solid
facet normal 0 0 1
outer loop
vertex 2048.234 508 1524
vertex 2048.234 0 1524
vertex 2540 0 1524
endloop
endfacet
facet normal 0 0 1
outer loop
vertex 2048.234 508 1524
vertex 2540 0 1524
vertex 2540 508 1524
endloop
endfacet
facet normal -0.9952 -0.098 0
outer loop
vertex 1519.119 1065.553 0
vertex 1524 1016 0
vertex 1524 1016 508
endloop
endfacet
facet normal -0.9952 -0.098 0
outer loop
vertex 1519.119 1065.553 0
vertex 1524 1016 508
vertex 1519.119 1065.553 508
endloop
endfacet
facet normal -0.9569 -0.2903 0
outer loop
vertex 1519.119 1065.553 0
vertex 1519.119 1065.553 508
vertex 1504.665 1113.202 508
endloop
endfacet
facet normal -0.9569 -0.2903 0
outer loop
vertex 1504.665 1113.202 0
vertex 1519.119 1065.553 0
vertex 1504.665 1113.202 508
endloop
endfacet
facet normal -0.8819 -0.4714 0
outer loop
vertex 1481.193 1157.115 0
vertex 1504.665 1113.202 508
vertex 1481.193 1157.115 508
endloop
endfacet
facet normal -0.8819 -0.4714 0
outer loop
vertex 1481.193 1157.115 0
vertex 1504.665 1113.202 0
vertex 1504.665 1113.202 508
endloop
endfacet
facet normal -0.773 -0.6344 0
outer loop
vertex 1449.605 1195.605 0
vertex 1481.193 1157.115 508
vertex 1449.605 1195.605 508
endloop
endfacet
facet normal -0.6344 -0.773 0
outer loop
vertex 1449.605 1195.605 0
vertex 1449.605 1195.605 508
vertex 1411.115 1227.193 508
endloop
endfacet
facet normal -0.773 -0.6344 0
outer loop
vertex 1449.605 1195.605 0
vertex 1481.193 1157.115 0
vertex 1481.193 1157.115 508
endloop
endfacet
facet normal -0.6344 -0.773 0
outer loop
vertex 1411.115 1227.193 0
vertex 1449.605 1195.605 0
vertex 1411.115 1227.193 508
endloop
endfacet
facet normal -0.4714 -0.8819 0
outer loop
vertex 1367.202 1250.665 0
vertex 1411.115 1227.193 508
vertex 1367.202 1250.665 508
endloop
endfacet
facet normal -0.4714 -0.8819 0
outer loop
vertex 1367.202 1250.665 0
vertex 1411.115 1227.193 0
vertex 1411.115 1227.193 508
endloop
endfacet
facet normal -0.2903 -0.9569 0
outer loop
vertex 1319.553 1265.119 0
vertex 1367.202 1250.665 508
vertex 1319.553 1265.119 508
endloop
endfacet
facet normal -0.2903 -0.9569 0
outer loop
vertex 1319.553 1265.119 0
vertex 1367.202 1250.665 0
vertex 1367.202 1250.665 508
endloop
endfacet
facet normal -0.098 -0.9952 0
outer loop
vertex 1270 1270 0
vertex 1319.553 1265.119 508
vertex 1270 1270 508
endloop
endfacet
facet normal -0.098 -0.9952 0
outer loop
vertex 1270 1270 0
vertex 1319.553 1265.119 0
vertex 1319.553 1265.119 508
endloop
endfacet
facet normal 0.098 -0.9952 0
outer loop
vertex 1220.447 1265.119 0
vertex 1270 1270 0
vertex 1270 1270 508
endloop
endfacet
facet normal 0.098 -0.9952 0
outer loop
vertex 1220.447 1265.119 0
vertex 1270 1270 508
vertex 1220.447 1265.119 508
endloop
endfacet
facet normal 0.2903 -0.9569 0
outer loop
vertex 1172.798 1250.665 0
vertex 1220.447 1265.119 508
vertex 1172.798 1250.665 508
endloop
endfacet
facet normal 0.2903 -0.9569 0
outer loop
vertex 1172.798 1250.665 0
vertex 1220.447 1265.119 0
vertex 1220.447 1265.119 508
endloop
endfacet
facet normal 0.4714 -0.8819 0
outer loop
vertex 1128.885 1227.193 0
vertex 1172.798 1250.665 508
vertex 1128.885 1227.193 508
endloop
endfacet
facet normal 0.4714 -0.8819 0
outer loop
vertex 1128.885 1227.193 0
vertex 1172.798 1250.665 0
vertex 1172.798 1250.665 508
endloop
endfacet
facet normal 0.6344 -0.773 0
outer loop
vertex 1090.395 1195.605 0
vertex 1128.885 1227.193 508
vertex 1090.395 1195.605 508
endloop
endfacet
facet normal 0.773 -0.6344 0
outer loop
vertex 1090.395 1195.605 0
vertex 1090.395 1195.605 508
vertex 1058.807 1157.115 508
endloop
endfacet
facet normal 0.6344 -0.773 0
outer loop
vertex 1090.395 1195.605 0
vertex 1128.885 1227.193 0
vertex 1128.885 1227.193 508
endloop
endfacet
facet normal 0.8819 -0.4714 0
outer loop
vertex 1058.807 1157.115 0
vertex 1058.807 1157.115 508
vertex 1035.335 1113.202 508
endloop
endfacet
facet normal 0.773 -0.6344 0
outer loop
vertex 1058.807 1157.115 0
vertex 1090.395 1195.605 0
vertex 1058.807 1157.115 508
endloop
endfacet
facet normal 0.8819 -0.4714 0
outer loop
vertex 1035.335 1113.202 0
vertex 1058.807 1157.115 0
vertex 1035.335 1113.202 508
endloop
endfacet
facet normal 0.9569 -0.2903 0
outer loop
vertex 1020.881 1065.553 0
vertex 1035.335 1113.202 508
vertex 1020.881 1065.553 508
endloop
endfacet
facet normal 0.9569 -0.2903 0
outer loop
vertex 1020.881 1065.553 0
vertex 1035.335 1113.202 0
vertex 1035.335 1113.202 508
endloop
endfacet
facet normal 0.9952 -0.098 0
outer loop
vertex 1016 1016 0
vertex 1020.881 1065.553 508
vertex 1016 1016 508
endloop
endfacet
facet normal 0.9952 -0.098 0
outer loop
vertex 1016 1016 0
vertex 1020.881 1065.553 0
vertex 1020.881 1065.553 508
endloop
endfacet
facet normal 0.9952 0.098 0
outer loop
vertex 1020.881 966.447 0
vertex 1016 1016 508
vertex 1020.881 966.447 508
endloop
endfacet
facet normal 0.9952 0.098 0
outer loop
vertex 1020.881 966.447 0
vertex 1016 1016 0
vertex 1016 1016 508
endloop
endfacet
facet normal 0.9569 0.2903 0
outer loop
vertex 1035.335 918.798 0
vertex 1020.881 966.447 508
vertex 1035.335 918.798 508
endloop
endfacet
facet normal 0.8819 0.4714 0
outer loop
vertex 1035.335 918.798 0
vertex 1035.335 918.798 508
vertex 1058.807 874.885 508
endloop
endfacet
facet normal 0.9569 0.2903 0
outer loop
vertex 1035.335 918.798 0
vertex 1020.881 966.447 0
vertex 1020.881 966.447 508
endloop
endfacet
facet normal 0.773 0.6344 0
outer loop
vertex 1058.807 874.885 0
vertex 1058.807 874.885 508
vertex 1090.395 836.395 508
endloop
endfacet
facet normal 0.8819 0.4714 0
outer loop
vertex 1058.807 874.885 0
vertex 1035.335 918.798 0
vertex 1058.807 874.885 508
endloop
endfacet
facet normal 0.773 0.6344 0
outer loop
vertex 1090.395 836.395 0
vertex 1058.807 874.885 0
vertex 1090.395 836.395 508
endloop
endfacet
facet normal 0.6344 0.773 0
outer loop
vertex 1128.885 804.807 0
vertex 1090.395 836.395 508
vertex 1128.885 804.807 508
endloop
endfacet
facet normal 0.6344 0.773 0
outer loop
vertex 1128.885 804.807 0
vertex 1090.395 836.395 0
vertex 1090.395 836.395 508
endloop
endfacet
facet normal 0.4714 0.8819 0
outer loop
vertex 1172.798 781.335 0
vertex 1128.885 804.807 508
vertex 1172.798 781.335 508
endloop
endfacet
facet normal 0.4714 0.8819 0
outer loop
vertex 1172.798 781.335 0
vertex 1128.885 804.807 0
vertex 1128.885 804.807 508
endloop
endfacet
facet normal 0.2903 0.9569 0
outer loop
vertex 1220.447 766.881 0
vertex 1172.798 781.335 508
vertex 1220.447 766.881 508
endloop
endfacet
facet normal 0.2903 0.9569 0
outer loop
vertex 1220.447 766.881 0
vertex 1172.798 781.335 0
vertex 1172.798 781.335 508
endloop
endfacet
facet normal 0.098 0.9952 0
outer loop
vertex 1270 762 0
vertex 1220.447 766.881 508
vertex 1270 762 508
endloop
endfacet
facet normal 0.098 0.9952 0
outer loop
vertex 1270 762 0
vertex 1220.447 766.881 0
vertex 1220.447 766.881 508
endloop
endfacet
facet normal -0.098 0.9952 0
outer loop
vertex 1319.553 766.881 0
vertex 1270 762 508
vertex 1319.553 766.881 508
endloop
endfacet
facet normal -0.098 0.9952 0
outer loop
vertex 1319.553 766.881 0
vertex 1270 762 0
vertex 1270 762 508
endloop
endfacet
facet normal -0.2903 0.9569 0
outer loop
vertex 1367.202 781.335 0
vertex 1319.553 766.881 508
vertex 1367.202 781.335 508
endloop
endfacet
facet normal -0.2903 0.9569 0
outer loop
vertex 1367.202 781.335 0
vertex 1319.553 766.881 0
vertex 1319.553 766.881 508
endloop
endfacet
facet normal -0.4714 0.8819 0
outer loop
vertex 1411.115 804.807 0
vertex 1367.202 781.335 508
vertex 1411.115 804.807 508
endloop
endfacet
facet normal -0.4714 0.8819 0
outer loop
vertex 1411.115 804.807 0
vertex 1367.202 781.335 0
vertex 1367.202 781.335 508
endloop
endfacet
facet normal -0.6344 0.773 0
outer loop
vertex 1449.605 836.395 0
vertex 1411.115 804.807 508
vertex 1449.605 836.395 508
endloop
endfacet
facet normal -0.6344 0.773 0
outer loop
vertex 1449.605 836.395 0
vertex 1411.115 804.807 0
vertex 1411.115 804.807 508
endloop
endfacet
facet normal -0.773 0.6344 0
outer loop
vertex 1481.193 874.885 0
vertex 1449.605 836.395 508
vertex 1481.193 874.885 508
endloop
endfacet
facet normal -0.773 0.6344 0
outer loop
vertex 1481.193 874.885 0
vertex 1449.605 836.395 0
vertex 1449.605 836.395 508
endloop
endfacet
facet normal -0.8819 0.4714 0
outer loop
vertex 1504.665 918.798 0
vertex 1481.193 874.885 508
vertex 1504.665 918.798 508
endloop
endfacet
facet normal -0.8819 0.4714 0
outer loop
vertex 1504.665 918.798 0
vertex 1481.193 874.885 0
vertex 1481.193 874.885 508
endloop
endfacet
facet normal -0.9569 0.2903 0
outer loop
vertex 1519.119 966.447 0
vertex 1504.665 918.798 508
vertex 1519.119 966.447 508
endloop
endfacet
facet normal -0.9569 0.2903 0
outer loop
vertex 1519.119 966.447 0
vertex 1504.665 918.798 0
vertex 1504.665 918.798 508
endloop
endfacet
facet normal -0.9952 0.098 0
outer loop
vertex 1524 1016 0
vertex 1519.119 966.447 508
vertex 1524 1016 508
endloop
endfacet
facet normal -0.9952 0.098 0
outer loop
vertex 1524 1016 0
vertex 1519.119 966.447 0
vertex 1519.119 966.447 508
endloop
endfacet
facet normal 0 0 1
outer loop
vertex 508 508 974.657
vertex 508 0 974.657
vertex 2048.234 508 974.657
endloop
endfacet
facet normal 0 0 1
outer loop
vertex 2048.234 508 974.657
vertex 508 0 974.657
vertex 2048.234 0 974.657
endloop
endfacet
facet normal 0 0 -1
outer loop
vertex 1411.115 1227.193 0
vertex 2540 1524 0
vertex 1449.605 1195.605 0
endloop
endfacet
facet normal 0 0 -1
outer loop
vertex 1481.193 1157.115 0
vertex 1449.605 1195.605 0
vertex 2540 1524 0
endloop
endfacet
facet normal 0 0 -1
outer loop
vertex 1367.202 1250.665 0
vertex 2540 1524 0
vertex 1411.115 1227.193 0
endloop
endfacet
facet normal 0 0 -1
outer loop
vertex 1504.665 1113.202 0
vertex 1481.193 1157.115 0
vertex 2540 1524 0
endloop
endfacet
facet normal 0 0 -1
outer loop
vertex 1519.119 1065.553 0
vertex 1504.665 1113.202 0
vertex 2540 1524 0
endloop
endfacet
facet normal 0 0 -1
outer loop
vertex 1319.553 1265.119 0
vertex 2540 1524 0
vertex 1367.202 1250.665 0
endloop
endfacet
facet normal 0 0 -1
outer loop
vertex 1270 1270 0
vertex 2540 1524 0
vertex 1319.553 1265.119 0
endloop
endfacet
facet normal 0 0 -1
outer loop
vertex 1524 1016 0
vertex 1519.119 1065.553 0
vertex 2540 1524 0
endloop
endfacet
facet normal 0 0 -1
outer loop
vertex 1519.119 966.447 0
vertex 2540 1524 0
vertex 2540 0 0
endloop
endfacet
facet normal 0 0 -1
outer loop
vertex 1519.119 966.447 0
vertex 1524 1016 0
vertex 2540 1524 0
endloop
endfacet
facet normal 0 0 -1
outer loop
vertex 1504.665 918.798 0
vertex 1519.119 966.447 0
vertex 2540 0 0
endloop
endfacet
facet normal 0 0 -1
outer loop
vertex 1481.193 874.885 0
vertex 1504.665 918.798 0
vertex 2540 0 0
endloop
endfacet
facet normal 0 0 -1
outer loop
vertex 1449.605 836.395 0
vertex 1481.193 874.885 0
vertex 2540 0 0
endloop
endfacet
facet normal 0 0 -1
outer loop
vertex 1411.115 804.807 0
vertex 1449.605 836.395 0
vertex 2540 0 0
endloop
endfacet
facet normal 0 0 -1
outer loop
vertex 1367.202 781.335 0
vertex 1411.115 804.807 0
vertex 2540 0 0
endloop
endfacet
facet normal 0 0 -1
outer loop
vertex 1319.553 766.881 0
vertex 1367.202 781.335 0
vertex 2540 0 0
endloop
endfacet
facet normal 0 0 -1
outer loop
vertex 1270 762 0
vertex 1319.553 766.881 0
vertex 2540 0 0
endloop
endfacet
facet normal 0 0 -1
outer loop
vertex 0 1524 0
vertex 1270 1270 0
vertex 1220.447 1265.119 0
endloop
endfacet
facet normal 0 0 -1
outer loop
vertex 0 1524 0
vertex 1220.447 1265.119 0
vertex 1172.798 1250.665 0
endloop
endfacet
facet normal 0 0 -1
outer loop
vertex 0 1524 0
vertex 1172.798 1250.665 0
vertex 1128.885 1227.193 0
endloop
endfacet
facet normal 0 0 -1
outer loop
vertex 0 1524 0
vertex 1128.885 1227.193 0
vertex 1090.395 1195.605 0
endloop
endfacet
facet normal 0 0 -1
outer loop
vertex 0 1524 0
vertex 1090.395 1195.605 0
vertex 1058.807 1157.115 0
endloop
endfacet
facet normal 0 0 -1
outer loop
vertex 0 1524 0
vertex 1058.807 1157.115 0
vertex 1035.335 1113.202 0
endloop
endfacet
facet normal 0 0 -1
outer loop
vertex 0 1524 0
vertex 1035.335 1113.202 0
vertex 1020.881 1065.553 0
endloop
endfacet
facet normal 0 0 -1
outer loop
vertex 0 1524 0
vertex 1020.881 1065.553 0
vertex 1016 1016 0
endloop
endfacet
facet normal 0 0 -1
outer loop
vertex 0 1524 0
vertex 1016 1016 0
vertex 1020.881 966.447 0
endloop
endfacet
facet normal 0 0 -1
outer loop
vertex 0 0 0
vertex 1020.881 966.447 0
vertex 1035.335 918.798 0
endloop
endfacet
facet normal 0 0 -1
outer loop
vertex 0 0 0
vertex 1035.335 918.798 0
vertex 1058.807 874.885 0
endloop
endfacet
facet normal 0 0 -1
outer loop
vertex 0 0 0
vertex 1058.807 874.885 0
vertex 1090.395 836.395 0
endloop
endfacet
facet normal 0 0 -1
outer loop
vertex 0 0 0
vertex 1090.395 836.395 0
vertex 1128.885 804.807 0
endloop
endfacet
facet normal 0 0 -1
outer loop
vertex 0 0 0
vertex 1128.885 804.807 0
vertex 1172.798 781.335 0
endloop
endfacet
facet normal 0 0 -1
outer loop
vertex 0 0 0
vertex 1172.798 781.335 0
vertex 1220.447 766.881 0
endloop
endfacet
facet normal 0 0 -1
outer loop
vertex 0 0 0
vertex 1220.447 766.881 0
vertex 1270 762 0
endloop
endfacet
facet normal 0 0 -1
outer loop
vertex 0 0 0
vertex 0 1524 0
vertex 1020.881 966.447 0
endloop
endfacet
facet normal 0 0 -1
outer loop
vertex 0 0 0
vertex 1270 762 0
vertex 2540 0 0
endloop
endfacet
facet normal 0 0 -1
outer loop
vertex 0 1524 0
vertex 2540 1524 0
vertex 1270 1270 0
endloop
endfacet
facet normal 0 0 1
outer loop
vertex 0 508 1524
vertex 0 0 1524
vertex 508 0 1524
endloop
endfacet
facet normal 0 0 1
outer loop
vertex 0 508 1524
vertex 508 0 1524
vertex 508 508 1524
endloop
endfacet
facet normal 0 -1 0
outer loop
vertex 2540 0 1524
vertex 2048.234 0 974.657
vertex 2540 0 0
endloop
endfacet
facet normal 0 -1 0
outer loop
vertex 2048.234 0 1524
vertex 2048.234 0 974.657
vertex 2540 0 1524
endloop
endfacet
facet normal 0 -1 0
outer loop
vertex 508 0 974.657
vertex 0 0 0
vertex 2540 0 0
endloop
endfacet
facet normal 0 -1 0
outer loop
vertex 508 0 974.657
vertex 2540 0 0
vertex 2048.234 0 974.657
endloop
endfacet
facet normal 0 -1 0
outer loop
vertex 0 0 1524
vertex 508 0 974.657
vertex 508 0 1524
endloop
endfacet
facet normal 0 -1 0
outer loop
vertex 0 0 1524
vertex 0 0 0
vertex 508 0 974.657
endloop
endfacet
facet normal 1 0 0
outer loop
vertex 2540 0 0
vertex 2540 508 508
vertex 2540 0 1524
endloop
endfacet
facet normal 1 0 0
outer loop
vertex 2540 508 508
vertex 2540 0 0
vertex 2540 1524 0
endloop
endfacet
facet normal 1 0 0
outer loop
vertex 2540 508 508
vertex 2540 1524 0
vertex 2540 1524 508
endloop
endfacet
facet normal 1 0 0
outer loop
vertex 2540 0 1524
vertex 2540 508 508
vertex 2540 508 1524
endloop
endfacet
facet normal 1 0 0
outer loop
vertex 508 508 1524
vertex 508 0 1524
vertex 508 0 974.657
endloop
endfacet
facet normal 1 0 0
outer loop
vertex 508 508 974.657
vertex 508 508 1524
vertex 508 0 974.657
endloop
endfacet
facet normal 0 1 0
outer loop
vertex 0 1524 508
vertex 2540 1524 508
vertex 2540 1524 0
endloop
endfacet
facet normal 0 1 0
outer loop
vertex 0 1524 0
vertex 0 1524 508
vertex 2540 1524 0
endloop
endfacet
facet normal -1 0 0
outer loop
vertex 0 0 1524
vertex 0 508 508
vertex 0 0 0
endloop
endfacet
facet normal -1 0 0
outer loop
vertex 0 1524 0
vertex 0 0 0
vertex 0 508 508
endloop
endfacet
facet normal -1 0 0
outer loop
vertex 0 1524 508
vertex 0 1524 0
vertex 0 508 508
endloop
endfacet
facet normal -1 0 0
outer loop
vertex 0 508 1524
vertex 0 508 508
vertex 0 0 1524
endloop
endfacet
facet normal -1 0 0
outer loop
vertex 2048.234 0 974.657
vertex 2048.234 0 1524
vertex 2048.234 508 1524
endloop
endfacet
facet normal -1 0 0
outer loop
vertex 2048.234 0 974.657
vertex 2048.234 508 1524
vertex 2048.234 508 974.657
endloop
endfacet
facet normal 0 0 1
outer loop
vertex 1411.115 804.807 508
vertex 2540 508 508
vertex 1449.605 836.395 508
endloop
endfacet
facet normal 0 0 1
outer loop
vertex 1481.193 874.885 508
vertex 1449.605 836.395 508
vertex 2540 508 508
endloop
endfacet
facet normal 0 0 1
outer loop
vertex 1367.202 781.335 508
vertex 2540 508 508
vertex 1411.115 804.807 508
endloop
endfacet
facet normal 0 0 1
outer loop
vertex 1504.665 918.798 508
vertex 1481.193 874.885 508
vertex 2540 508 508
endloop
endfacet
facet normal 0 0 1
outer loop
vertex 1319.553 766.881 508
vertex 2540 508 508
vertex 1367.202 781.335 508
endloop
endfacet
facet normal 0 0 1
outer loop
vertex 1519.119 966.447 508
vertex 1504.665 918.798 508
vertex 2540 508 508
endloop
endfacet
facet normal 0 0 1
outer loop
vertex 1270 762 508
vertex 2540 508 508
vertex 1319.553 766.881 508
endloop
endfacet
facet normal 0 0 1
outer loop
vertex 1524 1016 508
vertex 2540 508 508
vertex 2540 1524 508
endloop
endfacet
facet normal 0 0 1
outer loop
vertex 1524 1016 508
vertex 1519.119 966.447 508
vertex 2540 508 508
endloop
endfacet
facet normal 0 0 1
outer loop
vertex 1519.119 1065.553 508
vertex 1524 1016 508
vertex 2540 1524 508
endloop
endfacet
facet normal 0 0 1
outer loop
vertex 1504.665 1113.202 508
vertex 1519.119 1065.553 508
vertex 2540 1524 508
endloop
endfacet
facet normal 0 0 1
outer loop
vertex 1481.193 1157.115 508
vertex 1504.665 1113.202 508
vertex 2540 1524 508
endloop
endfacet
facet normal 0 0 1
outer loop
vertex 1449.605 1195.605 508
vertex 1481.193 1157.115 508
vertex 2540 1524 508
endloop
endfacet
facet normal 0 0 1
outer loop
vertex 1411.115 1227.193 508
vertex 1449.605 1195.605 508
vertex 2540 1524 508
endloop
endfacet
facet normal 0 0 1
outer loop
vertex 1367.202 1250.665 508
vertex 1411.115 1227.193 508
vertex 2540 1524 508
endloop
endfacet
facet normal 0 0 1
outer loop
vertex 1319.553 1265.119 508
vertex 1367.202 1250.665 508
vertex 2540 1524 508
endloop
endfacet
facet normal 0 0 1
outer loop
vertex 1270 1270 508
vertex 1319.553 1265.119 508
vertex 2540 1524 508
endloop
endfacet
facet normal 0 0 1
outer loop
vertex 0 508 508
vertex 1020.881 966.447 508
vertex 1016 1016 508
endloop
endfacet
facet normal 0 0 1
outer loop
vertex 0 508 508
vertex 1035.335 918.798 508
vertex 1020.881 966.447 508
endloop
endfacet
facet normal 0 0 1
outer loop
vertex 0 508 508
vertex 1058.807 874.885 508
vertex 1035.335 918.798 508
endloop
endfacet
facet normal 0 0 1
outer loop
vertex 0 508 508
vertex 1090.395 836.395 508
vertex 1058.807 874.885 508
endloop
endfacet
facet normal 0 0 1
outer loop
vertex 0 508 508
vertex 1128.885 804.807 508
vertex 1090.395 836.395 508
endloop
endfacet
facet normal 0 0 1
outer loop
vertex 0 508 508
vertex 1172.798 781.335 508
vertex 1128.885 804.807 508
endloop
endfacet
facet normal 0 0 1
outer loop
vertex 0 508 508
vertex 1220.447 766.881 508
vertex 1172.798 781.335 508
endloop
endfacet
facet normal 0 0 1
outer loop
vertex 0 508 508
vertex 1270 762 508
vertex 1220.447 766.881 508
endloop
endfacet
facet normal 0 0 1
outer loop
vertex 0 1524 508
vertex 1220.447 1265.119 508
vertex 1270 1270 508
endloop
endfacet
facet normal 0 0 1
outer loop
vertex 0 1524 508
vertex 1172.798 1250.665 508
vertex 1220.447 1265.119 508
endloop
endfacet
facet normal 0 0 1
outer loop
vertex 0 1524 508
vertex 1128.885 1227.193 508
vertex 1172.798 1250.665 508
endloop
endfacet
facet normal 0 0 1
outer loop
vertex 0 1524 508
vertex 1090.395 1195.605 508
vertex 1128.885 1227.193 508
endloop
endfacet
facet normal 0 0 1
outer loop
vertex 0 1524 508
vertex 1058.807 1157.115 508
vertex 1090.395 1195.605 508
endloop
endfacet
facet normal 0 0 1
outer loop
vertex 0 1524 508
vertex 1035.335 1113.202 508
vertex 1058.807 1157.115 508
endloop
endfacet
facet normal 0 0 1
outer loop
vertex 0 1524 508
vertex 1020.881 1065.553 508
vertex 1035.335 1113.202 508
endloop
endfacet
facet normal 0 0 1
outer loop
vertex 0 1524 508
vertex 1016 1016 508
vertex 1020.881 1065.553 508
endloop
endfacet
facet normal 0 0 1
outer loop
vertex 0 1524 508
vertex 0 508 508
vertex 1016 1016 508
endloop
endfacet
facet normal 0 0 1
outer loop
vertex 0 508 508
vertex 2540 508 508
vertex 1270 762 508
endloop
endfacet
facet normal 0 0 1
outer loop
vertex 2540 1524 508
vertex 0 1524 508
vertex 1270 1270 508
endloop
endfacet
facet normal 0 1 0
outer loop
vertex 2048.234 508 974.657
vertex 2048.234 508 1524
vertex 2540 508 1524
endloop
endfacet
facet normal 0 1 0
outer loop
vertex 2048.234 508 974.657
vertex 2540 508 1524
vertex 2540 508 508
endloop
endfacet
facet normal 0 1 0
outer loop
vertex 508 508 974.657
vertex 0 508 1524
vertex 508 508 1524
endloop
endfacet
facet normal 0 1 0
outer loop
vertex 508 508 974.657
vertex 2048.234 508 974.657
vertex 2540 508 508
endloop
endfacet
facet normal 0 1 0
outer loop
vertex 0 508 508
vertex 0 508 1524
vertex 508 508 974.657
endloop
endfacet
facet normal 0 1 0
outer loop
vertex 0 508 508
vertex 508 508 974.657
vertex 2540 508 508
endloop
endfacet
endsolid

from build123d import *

# Parameters (mm, degrees)
BOSS_EXTRUDE1_DEPTH = 2540
SKETCH2_W           = 1540.234303032
SKETCH2_H           = 549.342952078
CUT_EXTRUDE1_DEPTH  = 508
SKETCH3_R           = 254
CUT_EXTRUDE2_DEPTH  = 508


with BuildPart() as part:
    # Sketch1 → Boss-Extrude1 (new body)
    with BuildSketch(Plane(origin=(0, 0, 0), x_dir=(0, 0, -1), z_dir=(1, 0, 0))):
        Polygon((0, 0), (-1524, 0), (-1524, 508), (-508, 508), (-508, 1524), (0, 1524), align=None)
    extrude(amount=BOSS_EXTRUDE1_DEPTH)

    # Sketch2 → Cut-Extrude1 (cut)
    with BuildSketch(Plane(origin=(0, 0, 0), x_dir=(1, 0, 0), z_dir=(0, 1, 0))):
        with Locations((1278.117151516, -1249.328523961)):
            Rectangle(SKETCH2_W, SKETCH2_H)
    extrude(amount=CUT_EXTRUDE1_DEPTH, mode=Mode.SUBTRACT)

    # Sketch3 → Cut-Extrude2 (cut)
    with BuildSketch(Plane.XY):
        with Locations((1270, 1016)):
            Circle(SKETCH3_R)
    extrude(amount=CUT_EXTRUDE2_DEPTH, mode=Mode.SUBTRACT)


solid = part.part
